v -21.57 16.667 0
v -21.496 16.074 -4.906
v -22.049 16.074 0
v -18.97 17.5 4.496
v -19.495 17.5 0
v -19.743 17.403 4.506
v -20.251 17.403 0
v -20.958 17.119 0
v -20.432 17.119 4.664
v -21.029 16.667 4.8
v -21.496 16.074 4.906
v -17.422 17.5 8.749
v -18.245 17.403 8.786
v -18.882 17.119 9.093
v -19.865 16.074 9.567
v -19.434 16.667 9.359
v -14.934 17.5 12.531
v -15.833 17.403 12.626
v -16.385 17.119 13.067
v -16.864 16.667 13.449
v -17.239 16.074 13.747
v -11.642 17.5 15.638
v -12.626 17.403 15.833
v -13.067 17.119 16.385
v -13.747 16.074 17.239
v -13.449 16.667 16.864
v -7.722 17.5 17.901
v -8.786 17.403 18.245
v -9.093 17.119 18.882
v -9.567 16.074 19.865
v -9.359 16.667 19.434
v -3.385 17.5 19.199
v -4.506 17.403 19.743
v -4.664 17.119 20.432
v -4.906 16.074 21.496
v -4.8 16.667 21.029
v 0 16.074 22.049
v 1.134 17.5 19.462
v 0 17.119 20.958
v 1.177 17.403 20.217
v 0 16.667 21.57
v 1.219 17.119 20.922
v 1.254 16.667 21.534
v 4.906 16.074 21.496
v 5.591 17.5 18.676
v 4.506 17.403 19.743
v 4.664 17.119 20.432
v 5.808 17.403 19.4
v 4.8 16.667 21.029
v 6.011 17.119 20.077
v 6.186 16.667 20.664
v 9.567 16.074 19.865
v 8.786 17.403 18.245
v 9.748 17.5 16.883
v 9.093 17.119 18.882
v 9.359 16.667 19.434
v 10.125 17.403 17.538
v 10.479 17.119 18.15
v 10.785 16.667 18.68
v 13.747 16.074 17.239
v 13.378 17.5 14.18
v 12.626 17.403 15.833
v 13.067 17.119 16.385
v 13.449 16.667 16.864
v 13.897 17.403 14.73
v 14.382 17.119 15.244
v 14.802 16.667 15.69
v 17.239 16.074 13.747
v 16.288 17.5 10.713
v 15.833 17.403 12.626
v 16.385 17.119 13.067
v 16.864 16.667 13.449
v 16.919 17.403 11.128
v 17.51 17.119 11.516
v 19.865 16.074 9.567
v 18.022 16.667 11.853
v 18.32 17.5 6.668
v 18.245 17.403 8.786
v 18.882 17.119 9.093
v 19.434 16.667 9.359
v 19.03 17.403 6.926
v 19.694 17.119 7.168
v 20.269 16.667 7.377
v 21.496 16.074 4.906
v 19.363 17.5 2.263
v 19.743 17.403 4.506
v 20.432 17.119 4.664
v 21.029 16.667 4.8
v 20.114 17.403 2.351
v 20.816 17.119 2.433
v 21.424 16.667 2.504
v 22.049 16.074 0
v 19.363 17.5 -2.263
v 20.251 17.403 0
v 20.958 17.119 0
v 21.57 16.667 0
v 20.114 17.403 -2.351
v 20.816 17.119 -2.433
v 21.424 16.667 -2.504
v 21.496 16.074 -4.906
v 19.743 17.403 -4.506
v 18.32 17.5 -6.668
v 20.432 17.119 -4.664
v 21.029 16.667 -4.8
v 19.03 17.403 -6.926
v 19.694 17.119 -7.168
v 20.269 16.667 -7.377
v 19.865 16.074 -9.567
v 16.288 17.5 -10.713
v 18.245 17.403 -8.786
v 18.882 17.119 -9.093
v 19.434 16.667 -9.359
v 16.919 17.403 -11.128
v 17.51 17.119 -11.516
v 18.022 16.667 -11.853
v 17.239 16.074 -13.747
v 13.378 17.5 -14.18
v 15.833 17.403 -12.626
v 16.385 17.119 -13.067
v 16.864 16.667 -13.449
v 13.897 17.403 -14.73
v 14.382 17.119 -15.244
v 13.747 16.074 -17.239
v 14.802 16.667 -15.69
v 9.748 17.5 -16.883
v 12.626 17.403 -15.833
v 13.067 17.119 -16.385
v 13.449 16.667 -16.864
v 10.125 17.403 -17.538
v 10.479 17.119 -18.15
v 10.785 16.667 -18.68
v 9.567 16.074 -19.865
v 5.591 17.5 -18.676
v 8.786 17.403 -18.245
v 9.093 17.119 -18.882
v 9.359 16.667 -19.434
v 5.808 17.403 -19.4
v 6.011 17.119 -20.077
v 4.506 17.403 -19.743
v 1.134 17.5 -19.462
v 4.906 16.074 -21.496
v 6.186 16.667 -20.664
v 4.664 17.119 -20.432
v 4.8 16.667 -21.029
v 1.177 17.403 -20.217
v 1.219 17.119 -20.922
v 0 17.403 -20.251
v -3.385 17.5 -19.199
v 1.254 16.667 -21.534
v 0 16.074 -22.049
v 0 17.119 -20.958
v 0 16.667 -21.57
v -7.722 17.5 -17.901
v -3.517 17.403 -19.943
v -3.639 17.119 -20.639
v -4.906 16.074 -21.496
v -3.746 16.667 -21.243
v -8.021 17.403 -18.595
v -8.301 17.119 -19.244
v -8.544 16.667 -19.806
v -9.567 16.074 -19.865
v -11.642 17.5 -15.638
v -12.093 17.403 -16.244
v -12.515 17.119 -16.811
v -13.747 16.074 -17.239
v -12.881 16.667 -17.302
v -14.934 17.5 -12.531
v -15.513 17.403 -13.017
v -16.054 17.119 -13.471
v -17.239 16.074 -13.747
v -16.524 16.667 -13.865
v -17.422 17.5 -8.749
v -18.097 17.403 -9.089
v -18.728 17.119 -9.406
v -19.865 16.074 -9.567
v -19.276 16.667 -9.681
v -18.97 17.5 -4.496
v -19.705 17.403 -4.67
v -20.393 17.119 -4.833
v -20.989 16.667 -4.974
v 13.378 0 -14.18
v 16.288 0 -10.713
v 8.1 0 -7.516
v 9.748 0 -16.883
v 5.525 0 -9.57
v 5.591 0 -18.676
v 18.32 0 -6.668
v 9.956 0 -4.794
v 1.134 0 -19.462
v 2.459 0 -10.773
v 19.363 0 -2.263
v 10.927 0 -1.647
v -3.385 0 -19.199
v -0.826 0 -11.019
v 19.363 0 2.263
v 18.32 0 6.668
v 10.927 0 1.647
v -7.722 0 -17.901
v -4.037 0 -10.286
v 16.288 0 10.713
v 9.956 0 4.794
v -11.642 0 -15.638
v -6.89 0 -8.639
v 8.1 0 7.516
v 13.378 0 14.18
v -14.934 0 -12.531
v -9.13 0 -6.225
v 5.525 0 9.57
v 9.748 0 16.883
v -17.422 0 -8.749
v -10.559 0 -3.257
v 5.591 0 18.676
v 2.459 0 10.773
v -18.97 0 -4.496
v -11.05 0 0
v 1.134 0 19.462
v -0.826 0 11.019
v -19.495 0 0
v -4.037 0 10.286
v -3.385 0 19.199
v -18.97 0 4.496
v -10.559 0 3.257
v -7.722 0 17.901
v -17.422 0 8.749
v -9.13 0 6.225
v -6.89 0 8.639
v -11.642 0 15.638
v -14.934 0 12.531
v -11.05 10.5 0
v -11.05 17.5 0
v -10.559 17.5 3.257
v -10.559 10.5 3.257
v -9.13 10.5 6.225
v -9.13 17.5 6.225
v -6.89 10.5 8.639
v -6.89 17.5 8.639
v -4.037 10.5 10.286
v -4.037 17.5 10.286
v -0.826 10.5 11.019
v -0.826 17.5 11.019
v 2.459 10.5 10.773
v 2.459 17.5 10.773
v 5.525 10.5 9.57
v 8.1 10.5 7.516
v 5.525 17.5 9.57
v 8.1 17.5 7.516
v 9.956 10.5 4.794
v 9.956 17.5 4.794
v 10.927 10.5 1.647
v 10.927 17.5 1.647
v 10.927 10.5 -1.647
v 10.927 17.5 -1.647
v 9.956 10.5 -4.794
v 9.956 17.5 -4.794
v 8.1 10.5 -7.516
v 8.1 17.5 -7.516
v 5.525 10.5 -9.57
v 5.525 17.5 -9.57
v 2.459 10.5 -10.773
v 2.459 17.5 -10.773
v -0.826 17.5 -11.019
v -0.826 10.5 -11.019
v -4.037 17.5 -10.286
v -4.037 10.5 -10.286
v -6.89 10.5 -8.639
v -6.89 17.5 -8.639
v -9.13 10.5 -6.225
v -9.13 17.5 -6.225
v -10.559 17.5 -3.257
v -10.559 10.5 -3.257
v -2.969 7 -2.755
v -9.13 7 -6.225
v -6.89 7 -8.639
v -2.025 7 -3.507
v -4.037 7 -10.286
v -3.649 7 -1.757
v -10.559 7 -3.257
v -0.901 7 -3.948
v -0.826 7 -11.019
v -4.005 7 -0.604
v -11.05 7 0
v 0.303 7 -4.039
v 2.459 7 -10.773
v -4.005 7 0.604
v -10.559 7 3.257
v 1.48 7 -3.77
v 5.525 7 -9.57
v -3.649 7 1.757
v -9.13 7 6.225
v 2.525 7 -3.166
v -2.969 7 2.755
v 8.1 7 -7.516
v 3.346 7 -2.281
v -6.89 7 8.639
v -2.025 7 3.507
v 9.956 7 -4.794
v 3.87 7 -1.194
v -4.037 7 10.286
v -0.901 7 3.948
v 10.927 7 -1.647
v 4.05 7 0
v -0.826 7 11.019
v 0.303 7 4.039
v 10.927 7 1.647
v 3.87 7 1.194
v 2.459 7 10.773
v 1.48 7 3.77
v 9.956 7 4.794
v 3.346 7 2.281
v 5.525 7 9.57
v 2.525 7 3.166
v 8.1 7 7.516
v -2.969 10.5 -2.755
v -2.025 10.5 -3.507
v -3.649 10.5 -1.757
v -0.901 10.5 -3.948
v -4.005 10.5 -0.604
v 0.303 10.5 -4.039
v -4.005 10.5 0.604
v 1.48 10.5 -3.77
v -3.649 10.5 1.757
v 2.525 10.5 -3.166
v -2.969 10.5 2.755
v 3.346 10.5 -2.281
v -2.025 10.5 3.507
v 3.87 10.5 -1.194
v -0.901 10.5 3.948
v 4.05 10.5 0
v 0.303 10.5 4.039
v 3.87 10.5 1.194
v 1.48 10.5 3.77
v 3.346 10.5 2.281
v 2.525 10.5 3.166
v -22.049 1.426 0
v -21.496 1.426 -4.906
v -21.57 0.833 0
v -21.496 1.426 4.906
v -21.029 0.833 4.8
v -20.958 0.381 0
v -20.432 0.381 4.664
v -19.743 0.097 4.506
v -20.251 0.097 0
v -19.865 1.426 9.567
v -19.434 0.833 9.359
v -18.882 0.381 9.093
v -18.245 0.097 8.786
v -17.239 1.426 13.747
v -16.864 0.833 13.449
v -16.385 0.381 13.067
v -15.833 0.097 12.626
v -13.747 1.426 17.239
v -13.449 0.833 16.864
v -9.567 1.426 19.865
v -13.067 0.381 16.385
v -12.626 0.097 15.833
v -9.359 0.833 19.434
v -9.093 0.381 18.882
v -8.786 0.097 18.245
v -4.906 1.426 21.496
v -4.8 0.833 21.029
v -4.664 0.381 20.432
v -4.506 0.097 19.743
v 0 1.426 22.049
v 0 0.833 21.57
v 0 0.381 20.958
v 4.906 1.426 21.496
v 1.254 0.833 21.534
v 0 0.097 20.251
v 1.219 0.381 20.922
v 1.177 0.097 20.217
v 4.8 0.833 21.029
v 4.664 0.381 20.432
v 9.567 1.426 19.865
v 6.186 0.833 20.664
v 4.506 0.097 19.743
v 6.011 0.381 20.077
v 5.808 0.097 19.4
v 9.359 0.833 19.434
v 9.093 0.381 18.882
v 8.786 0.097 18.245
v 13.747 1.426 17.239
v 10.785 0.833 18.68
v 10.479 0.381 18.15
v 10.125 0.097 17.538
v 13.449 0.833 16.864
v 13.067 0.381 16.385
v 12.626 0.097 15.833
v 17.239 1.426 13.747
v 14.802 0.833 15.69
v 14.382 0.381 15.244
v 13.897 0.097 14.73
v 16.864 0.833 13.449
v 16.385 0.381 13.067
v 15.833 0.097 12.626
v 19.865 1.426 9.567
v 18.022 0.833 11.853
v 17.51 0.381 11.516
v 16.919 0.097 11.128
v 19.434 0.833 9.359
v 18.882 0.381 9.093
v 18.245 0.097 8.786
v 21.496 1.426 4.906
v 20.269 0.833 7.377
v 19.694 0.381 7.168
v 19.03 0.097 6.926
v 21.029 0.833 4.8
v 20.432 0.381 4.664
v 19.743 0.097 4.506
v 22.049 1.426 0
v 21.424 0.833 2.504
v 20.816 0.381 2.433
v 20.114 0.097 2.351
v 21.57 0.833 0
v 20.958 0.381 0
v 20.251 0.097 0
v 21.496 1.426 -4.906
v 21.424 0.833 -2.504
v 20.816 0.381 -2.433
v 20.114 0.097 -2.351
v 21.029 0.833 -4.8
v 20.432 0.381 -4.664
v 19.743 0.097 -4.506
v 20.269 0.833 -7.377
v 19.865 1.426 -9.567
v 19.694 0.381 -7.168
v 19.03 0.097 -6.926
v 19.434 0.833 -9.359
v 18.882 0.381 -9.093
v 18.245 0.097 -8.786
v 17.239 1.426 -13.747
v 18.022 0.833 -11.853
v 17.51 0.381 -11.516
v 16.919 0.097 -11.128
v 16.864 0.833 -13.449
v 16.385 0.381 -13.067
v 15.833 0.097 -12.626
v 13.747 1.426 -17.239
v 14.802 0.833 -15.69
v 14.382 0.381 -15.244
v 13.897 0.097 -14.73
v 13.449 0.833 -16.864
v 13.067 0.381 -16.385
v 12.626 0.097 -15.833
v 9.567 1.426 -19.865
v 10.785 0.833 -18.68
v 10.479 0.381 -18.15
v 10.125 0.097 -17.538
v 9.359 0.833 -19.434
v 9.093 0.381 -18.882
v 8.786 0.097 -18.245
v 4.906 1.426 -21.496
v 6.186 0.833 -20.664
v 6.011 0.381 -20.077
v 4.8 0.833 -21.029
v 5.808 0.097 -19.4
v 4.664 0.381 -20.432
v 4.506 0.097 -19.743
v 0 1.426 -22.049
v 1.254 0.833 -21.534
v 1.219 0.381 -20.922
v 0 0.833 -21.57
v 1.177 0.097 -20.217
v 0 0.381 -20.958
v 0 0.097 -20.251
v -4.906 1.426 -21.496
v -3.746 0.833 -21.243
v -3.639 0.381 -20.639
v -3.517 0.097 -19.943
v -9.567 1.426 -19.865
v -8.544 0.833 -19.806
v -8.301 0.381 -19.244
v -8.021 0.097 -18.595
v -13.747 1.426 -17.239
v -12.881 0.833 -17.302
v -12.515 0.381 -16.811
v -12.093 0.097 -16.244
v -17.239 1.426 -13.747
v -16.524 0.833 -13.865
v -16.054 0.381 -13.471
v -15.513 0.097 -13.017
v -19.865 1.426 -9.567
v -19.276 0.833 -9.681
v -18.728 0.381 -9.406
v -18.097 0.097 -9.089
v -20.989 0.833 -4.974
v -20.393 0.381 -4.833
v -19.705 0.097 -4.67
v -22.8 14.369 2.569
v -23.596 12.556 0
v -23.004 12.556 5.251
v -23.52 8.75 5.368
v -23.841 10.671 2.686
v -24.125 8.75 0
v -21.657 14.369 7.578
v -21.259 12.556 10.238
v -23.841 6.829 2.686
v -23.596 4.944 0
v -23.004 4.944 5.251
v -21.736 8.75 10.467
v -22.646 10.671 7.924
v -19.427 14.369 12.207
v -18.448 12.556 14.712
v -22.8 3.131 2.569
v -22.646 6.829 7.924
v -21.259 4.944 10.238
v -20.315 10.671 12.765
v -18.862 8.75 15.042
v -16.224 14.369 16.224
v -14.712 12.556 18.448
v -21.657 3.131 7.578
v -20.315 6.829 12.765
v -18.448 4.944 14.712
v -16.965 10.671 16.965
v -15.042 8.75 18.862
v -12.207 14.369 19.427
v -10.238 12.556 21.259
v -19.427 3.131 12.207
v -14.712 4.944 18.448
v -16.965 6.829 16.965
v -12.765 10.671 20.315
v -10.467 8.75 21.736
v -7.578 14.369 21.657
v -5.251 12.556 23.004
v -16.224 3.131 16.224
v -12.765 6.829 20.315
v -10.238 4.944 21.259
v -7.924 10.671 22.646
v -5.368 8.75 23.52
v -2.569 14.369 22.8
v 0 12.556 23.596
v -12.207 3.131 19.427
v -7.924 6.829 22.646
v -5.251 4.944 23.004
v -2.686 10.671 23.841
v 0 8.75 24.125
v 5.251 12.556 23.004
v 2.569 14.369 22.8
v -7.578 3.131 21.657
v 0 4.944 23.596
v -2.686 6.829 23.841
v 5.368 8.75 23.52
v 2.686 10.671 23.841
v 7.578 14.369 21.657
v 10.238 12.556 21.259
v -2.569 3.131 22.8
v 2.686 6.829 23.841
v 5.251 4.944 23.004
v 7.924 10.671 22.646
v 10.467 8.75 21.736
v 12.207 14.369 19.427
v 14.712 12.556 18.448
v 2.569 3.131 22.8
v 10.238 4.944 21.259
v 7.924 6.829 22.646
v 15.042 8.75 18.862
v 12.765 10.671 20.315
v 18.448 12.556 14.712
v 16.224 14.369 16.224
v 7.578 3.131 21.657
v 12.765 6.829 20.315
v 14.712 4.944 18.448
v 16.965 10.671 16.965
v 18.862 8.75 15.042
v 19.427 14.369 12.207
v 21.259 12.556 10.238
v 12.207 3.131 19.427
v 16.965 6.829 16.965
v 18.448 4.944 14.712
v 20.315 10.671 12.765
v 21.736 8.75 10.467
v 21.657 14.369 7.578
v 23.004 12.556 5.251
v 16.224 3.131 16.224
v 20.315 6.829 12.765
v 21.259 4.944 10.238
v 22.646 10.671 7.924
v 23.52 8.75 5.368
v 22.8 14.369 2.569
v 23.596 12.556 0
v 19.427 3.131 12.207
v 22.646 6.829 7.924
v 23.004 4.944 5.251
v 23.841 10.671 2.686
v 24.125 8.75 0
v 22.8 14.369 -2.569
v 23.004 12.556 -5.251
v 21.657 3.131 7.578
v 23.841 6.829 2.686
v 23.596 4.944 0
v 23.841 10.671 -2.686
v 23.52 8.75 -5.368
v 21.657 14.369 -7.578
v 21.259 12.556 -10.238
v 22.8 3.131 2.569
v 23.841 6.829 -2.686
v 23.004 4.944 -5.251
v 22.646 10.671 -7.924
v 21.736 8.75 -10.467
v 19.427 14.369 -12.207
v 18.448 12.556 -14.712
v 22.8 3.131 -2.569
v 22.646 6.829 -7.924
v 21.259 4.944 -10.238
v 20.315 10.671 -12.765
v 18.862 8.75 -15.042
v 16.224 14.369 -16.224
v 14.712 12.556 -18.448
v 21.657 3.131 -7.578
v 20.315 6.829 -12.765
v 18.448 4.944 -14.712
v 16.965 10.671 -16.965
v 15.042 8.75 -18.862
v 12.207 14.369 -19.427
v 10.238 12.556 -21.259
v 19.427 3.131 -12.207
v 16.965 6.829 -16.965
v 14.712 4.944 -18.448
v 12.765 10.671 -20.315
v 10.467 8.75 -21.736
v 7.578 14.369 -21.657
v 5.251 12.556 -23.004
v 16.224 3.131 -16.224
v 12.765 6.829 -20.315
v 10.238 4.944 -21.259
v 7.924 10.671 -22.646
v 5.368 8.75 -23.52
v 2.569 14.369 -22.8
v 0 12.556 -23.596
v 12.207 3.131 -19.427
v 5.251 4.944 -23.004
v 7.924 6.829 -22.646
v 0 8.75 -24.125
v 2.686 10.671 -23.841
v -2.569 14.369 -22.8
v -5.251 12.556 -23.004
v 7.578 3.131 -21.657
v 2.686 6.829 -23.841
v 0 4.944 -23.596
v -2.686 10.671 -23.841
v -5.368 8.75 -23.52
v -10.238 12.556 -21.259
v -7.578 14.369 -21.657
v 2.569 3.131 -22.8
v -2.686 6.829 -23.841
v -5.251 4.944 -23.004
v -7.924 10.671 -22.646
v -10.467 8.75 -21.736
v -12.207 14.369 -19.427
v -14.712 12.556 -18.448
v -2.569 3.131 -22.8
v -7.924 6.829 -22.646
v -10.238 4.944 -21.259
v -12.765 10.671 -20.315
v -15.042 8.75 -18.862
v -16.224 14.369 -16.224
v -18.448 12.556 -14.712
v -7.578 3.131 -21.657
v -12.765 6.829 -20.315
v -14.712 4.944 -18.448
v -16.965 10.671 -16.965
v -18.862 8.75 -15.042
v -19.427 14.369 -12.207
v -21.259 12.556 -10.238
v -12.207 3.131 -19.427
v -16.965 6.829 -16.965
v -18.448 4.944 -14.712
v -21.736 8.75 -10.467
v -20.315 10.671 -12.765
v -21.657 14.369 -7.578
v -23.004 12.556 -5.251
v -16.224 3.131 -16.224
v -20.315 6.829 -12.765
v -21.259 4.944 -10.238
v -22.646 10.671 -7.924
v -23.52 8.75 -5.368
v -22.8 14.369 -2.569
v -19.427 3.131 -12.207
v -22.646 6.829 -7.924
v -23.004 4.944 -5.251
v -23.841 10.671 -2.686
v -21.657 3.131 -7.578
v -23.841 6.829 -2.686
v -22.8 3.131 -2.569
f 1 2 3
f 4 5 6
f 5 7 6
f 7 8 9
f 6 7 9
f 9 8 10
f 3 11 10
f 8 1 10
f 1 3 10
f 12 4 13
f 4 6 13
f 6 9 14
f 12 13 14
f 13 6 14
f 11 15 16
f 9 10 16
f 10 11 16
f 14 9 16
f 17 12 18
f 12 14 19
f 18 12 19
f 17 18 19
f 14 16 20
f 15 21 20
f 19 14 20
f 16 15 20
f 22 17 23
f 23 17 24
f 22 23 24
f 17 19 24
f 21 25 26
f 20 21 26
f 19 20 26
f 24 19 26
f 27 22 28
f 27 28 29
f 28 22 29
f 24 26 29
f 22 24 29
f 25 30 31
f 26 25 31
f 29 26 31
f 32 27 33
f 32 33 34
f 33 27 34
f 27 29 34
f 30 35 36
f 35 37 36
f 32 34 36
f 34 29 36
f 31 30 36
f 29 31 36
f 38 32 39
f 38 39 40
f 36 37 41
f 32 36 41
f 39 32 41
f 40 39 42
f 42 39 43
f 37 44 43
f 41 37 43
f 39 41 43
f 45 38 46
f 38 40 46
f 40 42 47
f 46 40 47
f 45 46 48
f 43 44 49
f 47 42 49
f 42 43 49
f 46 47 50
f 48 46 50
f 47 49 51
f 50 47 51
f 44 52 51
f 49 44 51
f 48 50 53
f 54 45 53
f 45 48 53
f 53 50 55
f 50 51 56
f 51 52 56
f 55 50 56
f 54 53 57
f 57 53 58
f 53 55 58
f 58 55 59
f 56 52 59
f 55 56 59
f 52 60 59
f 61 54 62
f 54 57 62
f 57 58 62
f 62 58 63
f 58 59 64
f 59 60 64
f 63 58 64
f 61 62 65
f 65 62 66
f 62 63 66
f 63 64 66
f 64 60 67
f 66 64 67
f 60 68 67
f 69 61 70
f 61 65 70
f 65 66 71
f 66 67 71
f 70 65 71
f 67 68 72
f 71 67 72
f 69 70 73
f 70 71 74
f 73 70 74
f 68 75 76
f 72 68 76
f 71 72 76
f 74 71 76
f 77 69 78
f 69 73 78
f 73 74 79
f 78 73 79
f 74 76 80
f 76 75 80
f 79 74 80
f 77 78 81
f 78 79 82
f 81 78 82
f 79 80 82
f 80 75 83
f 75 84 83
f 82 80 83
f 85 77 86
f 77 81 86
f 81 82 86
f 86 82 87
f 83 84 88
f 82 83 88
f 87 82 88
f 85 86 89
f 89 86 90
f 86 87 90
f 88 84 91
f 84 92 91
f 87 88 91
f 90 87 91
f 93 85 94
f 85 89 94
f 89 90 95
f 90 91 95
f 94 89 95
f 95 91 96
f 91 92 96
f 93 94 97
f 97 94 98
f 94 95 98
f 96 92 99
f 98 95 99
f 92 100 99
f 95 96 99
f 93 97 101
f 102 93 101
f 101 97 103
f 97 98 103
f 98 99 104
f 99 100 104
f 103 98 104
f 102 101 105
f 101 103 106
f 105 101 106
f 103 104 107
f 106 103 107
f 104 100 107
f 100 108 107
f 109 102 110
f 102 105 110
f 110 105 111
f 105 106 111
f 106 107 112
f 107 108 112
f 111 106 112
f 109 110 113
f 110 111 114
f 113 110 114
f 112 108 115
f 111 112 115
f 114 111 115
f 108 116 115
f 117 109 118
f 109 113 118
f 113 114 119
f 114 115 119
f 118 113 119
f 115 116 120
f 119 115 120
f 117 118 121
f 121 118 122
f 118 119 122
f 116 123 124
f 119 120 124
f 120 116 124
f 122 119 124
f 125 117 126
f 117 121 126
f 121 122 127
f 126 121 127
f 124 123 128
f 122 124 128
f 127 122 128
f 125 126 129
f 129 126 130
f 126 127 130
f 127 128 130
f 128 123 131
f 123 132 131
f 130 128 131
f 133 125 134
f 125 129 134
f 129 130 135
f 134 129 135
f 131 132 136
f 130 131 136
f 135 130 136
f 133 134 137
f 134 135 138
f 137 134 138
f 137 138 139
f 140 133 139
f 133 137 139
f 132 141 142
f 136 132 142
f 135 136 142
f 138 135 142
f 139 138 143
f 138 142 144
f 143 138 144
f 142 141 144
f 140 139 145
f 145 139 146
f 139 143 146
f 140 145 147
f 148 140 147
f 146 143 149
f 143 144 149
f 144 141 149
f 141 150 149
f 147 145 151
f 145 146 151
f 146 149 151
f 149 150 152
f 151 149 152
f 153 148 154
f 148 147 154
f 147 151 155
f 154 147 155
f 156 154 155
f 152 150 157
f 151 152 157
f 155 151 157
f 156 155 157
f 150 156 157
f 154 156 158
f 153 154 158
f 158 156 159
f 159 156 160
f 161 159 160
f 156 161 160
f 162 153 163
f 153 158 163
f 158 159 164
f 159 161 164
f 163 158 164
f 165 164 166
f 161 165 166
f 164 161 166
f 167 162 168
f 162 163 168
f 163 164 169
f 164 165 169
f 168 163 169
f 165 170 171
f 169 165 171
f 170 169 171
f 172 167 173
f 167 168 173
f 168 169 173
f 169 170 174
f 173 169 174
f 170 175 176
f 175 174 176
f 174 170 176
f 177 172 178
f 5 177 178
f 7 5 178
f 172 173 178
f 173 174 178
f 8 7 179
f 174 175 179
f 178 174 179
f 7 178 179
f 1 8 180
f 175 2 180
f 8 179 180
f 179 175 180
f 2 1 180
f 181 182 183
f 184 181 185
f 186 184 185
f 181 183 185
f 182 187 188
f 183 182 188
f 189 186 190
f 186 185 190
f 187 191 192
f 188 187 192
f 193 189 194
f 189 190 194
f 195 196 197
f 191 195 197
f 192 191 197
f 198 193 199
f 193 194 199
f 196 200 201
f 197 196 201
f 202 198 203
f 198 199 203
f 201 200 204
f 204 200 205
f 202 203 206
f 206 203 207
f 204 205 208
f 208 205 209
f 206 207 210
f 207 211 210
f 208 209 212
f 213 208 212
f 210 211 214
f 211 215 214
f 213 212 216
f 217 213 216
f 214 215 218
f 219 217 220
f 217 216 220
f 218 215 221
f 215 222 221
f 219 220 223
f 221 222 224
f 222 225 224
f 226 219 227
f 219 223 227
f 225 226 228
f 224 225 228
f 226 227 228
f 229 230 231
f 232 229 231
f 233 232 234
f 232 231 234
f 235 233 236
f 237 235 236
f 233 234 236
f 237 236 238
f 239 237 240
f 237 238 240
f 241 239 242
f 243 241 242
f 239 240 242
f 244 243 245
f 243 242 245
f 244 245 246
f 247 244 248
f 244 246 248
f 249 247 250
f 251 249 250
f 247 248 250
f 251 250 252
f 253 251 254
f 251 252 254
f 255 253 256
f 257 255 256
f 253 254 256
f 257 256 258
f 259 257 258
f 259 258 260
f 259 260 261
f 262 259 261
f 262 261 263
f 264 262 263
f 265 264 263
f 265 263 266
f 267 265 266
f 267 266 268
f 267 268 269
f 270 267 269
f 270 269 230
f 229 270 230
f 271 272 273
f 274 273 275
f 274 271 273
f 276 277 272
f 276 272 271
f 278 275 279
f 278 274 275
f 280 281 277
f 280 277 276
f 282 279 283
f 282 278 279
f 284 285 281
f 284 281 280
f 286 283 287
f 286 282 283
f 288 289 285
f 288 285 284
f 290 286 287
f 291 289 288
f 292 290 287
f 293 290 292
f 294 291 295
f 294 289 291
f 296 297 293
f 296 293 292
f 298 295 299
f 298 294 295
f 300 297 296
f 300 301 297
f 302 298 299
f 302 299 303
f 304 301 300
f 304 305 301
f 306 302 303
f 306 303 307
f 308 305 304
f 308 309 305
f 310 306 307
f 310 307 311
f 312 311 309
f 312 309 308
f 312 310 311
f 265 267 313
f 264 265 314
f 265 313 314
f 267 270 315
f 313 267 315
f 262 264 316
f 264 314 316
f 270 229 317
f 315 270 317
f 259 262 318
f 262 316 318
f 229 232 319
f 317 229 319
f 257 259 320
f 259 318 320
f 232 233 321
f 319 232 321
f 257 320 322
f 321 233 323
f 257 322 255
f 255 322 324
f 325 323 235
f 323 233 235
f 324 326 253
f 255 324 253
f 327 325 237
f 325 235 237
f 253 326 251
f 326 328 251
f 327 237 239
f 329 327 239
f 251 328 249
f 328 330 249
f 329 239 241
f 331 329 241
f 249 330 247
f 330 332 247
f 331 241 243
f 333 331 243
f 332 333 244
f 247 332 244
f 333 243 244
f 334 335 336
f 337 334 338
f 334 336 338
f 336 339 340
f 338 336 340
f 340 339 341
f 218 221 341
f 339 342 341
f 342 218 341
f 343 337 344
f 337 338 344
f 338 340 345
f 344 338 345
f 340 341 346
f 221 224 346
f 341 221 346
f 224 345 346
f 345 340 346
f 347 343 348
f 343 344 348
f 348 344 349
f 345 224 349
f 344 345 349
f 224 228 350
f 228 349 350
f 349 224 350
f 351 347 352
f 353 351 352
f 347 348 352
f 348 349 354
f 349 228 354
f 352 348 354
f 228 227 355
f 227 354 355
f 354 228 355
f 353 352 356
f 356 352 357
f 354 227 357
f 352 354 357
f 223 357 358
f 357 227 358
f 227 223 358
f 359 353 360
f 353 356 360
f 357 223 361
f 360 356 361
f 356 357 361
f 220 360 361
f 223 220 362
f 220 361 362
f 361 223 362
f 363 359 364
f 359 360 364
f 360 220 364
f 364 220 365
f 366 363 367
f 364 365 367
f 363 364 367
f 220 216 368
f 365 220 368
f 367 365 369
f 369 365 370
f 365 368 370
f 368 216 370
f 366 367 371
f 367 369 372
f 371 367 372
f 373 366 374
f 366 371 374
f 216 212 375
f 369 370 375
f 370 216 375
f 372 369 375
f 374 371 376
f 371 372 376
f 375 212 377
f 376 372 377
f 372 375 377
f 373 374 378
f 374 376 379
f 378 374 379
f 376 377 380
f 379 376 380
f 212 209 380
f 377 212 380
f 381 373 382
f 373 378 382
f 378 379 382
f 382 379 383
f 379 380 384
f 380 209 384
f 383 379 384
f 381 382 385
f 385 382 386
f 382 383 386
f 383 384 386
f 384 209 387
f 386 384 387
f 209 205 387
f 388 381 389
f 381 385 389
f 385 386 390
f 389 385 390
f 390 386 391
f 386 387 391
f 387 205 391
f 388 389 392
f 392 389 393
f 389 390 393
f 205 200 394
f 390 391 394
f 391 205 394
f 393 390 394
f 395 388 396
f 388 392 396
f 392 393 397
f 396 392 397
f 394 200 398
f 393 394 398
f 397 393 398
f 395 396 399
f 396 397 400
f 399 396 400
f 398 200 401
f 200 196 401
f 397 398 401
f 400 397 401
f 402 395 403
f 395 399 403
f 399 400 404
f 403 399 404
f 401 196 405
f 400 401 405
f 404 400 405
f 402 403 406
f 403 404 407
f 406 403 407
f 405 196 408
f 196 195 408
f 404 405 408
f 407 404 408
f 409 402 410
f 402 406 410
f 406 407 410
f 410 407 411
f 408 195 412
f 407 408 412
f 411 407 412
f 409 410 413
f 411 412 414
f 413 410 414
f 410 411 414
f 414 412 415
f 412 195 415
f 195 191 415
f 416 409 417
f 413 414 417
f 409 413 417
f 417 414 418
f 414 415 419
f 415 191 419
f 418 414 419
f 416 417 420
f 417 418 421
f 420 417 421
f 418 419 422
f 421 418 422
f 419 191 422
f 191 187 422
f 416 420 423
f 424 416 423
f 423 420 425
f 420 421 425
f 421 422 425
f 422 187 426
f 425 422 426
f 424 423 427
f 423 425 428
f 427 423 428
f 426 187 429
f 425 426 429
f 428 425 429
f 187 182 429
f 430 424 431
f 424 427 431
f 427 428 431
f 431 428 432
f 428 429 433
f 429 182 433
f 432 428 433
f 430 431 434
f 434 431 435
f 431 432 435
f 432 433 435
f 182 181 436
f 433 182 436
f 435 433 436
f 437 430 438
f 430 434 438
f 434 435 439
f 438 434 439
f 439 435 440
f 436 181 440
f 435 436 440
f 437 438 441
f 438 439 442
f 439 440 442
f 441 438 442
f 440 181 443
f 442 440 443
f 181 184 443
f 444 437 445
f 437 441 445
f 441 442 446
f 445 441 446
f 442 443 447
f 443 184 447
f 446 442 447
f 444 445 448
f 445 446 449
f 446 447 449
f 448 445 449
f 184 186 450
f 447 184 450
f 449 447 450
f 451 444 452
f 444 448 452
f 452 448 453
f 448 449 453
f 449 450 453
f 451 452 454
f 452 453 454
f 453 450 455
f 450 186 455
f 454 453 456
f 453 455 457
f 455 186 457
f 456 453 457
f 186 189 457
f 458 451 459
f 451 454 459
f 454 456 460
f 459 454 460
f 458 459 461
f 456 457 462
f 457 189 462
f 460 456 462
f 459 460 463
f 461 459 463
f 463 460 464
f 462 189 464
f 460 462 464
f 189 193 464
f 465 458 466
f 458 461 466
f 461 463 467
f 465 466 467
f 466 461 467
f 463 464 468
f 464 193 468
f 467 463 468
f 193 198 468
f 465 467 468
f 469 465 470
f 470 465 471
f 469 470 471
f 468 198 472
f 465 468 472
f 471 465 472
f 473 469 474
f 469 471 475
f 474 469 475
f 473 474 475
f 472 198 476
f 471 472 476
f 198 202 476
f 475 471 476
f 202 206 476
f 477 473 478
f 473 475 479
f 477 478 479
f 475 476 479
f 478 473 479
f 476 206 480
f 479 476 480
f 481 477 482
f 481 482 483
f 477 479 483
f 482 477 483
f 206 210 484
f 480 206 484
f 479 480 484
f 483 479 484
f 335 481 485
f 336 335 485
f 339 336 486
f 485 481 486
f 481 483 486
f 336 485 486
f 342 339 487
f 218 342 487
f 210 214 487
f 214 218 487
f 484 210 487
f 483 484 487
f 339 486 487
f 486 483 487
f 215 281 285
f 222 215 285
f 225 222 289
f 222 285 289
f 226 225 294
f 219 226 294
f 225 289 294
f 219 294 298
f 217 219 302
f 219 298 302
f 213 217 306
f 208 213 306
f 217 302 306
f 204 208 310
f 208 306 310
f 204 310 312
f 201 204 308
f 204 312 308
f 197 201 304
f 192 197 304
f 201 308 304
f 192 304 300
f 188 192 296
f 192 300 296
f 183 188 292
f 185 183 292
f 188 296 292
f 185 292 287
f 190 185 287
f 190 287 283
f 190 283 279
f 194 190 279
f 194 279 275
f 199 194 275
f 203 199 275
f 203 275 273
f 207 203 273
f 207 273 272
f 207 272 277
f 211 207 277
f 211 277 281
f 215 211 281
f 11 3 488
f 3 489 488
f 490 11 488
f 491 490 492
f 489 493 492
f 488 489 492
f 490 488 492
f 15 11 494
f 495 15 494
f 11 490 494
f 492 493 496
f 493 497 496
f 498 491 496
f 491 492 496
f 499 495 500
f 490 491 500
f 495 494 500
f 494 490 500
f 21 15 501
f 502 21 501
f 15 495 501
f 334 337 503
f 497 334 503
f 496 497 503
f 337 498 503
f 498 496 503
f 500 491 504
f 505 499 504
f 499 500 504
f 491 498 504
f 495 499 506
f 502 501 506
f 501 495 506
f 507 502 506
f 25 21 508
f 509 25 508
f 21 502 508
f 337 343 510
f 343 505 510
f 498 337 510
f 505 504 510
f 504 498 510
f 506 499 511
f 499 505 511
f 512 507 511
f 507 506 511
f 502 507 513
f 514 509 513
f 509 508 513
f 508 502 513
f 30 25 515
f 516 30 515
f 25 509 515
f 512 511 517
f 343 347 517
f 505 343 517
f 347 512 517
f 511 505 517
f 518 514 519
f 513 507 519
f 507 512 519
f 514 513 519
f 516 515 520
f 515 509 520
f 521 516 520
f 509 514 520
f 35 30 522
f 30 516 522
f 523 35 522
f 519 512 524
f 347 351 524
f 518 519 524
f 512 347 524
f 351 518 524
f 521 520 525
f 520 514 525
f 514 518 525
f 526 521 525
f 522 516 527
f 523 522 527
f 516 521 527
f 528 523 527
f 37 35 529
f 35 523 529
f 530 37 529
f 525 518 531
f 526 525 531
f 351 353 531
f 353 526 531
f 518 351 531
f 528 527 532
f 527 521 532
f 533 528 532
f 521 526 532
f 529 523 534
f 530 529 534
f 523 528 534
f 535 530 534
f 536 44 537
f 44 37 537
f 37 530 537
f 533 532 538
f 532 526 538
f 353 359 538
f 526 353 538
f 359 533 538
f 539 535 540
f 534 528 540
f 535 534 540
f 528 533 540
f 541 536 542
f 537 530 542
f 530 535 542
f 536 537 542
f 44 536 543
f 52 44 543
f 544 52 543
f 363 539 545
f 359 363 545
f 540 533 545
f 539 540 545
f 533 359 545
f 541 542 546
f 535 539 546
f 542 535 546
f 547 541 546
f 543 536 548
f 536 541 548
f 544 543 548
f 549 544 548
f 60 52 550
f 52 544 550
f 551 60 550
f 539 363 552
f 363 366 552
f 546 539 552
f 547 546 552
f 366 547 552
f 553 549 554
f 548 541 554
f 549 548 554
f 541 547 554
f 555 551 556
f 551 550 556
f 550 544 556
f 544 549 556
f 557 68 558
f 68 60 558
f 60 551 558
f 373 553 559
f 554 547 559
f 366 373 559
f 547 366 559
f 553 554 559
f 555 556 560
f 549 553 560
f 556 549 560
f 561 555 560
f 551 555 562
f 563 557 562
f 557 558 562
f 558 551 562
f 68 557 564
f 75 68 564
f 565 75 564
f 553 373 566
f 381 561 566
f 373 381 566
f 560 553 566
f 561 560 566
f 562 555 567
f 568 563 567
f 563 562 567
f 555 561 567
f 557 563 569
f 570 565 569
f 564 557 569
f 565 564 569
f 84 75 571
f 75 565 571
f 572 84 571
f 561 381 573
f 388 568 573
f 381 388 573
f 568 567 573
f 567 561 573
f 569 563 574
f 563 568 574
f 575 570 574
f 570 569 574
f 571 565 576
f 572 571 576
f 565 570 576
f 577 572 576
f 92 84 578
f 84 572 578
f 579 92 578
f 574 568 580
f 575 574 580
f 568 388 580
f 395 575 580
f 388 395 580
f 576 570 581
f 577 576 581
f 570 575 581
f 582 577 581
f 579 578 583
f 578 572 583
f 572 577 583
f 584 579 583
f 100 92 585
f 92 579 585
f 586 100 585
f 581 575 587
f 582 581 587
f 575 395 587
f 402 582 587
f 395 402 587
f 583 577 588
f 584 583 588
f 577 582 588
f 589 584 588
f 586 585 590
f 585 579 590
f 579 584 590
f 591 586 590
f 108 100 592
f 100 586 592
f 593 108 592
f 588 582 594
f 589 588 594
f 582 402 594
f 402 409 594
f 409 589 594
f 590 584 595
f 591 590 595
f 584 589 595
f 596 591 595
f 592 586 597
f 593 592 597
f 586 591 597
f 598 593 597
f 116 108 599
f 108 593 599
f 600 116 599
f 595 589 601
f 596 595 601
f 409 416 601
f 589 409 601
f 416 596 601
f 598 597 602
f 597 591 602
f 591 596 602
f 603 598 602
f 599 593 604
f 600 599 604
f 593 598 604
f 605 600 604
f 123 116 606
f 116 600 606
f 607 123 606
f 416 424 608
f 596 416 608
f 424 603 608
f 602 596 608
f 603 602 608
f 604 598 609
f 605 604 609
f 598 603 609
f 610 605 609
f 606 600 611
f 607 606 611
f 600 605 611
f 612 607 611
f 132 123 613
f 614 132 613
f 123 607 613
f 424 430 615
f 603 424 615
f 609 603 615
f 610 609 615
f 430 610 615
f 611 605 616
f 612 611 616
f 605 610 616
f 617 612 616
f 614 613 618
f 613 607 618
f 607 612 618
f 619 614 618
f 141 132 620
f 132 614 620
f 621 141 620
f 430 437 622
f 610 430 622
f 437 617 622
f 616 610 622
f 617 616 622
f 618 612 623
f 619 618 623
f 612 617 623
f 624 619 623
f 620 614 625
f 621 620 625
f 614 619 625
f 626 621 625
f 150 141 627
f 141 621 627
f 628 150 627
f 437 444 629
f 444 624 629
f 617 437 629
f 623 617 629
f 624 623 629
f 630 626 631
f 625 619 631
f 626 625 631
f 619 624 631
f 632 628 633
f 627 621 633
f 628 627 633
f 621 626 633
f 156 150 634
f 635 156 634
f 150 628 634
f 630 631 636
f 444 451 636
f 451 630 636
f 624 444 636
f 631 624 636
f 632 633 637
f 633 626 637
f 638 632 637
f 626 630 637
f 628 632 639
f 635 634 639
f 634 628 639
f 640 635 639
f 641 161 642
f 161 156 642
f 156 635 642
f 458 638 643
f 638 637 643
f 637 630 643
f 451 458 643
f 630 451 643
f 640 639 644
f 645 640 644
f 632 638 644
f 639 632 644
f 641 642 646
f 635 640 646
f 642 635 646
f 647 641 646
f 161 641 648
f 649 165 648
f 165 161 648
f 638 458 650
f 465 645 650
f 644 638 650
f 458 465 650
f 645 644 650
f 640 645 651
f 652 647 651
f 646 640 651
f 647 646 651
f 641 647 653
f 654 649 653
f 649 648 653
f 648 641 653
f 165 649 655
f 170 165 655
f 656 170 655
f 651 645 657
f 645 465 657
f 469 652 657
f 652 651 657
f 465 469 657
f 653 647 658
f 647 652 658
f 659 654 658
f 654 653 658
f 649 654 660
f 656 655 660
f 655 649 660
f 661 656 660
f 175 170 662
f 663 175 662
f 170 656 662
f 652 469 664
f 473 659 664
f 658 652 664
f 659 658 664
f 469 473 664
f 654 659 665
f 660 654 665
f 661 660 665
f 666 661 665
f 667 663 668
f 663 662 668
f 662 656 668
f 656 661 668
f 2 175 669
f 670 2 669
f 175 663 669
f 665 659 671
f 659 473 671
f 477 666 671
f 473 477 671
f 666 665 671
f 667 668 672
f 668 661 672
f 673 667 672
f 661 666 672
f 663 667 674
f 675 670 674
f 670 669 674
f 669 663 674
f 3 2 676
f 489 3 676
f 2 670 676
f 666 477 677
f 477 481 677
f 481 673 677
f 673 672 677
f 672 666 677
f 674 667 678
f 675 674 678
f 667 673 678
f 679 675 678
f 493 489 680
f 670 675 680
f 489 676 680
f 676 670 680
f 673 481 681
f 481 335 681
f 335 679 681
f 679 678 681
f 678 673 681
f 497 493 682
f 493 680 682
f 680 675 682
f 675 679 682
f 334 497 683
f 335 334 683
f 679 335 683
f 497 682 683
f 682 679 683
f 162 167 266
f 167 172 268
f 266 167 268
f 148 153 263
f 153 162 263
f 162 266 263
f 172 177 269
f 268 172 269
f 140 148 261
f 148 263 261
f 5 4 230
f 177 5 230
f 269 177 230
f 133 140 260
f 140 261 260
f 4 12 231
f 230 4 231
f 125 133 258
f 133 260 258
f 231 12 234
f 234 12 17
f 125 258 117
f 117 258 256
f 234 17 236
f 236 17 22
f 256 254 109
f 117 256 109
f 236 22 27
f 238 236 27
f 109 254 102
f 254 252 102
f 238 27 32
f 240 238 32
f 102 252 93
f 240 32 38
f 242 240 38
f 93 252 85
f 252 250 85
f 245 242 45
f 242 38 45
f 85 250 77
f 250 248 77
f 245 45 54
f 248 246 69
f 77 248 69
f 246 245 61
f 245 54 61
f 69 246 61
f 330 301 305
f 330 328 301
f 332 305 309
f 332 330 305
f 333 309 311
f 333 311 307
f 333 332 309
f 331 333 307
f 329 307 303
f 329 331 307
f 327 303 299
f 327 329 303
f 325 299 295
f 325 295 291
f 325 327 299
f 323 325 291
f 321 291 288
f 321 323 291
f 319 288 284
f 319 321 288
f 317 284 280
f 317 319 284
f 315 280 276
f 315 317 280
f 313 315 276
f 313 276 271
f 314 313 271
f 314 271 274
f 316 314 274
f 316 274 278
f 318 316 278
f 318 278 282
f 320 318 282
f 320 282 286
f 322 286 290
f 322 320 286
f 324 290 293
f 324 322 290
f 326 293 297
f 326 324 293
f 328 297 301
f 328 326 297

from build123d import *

# Parameters (mm, degrees)
F2_R     = 11.05
F3_DEPTH = 25
F5_R     = 13.182718
F5_R_2   = 4.05
F6_DEPTH = 1.75


with BuildPart() as f1:
    # F0 (on Top) → F1 (revolve)
    with BuildSketch(Plane.XY):
        with BuildLine():
            Line((-19.49521, 0), (0, 0))
            Line((0, 0), (0, 17.5))
            Line((0, 17.5), (-19.49521, 17.5))
            ThreePointArc((-19.49521, 17.5), (-20.957649, 17.119403), (-22.049021, 16.074182))
            ThreePointArc((-22.049021, 16.074182), (-24.125, 8.75), (-22.049021, 1.425818))
            ThreePointArc((-22.049021, 1.425818), (-20.957649, 0.380597), (-19.49521, 0))
        make_face()
    revolve(axis=Axis((0, 8.75, 0), (0, 1, 0)))

    # F2 (on face) → F3 (cut)
    with BuildSketch(Plane(origin=(0, 17.5, 0), x_dir=(-1, 0, 0), z_dir=(0, 1, 0))):
        Circle(F2_R)
    extrude(amount=-F3_DEPTH, mode=Mode.SUBTRACT)

    # F5 (on mid) → F6 (join, symmetric)
    with BuildSketch(Plane.XZ.offset(-8.75)):
        Circle(F5_R)
        Circle(F5_R_2, mode=Mode.SUBTRACT)
    extrude(amount=F6_DEPTH, both=True)


solid = f1.part
